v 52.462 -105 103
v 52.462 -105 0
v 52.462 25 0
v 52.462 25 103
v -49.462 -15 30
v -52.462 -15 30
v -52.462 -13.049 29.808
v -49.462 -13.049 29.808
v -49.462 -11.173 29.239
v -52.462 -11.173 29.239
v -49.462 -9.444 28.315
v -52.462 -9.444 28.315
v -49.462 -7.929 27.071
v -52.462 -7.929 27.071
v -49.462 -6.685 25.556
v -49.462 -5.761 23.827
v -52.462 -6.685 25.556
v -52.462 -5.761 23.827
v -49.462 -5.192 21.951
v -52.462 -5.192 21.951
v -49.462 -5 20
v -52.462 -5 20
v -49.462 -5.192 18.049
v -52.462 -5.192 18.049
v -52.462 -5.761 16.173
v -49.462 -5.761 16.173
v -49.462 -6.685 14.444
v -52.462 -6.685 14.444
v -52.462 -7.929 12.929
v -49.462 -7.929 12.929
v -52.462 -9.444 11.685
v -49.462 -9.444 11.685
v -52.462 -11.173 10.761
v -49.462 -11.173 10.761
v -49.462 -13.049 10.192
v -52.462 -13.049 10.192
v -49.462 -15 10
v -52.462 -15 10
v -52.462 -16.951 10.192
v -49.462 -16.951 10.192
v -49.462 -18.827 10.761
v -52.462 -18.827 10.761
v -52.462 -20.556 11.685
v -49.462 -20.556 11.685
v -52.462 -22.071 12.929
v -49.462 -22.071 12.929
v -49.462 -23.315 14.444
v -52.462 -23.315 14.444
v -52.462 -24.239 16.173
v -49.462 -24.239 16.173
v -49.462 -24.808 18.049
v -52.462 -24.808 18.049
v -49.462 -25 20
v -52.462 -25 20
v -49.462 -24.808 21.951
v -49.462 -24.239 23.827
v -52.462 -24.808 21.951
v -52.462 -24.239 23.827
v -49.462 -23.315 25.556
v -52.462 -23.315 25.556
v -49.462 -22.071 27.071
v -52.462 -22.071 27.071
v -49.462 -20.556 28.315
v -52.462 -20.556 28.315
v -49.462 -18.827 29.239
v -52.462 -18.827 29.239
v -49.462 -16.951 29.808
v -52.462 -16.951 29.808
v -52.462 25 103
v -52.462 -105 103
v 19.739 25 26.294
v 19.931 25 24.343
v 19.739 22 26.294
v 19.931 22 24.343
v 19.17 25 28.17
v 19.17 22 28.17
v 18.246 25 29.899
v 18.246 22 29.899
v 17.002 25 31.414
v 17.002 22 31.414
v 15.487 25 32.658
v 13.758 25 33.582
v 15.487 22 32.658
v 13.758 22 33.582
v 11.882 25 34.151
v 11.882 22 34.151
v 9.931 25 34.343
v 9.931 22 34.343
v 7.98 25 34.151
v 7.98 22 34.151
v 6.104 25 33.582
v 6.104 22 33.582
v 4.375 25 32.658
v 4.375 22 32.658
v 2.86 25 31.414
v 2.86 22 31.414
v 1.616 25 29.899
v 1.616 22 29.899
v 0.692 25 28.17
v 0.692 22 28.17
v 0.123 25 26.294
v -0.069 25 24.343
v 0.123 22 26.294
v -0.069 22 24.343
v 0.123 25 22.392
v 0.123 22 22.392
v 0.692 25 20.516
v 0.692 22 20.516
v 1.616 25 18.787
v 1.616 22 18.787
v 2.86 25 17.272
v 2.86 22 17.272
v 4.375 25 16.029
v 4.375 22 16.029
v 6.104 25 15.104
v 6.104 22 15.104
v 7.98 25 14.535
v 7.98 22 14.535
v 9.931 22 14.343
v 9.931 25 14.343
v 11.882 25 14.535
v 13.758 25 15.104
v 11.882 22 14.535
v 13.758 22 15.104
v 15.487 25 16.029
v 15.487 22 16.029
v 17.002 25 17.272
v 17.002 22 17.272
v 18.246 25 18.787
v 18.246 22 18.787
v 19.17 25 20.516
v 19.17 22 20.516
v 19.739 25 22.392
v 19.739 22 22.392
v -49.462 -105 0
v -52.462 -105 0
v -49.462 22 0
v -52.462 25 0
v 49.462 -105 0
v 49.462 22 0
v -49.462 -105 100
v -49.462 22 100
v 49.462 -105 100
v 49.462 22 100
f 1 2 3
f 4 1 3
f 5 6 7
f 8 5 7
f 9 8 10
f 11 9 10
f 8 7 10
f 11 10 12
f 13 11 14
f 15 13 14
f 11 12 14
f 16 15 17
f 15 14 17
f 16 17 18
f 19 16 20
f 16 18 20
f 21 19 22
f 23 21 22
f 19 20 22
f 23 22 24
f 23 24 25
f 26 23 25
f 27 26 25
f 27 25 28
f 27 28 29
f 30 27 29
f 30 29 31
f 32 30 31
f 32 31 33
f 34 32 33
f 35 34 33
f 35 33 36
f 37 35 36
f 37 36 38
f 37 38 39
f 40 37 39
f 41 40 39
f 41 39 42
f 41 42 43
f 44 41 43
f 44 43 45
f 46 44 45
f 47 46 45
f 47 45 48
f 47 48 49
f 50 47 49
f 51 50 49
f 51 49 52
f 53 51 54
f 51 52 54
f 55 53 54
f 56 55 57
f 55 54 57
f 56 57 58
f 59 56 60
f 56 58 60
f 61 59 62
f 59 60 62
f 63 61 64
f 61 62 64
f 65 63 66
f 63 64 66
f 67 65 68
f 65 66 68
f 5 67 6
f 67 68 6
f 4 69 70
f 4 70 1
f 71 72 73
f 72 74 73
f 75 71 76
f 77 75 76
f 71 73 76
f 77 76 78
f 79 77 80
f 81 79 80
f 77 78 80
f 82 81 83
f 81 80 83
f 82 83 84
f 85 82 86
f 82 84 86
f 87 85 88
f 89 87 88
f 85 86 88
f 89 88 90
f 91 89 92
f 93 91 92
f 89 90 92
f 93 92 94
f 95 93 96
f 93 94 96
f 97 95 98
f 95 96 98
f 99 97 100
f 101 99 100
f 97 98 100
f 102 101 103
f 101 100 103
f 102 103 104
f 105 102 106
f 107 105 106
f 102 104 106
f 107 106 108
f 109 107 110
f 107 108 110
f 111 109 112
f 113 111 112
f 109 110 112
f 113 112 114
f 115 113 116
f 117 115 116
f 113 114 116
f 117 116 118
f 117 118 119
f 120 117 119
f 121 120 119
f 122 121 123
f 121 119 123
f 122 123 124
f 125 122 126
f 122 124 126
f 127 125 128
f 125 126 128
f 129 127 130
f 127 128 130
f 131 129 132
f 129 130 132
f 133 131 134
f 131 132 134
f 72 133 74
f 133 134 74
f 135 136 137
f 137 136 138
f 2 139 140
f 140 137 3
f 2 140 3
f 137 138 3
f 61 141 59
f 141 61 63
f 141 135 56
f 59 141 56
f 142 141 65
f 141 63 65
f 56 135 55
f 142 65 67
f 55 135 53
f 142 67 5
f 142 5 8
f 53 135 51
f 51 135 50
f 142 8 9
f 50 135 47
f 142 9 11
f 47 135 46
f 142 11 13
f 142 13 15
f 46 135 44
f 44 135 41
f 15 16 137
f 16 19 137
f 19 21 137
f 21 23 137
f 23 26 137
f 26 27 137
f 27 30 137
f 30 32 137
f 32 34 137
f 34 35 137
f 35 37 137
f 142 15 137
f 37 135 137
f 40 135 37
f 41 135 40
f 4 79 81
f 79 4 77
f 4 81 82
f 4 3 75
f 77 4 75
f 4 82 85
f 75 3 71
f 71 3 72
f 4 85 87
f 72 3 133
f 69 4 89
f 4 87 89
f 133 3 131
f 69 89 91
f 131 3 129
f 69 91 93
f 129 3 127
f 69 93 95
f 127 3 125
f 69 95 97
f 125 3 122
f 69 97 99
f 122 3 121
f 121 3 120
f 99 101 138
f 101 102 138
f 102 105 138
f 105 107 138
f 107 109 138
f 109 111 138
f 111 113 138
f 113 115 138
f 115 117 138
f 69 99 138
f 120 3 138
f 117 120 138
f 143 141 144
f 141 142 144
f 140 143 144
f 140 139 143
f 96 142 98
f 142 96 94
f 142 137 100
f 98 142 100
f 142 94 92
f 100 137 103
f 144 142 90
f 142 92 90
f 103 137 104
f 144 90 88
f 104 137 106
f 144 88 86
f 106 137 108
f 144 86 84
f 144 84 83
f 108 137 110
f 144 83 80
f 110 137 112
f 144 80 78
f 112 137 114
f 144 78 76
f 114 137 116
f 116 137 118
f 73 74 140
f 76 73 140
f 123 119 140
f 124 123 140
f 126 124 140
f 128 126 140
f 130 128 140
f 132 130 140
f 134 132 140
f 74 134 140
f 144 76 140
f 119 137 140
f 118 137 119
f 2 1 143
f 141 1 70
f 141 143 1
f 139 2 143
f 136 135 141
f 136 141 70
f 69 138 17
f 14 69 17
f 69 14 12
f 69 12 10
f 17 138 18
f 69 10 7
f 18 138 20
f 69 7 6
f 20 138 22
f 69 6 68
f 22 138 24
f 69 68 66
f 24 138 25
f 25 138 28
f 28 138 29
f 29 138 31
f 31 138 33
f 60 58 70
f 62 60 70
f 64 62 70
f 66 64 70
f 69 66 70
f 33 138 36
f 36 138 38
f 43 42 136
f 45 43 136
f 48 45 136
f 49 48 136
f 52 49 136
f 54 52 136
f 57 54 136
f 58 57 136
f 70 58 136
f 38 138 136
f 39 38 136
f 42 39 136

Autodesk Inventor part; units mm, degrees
ref_plane "YZ Plane" through (0, 0, 0) normal (1, 0, 0) x (0, 1, 0)
ref_plane "XZ Plane" through (0, 0, 0) normal (0, 1, 0) x (-1, 0, 0)
ref_plane "XY Plane" through (0, 0, 0) normal (0, 0, 1) x (1, 0, 0)
sketch "Sketch1" plane through (0, 0, 0) normal (0, 0, 1) x (1, 0, 0)
  line L0 (52.4625, 25) -> (-52.4625, 25)
  line L1 (-52.4625, 25) -> (-52.4625, -105)
  line L2 (52.4625, -105) -> (52.4625, 25)
  line L3 (-96.7125, -125) -> (96.7125, -125) projected
  line L4 (55.4625, -110) -> (55.4625, -50) projected
  line L5 (-55.4625, -50) -> (-55.4625, -110) projected
  line L6 (52.4625, -105) -> (49.4625, -105)
  line L7 (49.4625, -105) -> (49.4625, 22)
  line L8 (49.4625, 25) -> (52.4625, 25)
  line L9 (52.4625, 25) -> (52.4625, -105)
  line L10 (-52.4625, -105) -> (-49.4625, -105)
  line L11 (-49.4625, -105) -> (-49.4625, 22)
  line L12 (-49.4625, 25) -> (-52.4625, 25)
  line L13 (-52.4625, 25) -> (-52.4625, -105)
  line L14 (49.4625, 25) -> (-49.4625, 25)
  line L15 (-49.4625, 22) -> (49.4625, 22)
  line L16 (-52.4625, -105) -> (-49.4625, -105)
  line L17 (49.4625, -105) -> (52.4625, -105)
  point P0 (0, 0)
  point P1 (50.9625, -105)
  dimension "d7" = 127
  dimension "d8" = 20
  dimension "d9" = 3
  dimension "d10" = 3
  dimension "d11" = 98.925
  dimension "d12" = 3
  dimension "d13" = 3
extrude "Extrusion1" add sketch "Sketch1" along normal blind 100
sketch "Sketch2" plane through (0, 0, 100) normal (0, 0, 1) x (1, 0, 0)
  line L0 (52.4625, -105) -> (52.4625, 25) projected
  line L1 (-52.4625, 25) -> (-52.4625, -105) projected
  line L2 (52.4625, 25) -> (-52.4625, 25)
  line L3 (-52.4625, 25) -> (-52.4625, -105)
  line L4 (-52.4625, -105) -> (52.4625, -105)
  line L5 (52.4625, -105) -> (52.4625, 25)
  point P0 (0, 0)
extrude "Extrusion2" add sketch "Sketch2" along normal blind 3
sketch "Sketch3" plane through (-52.4625, -105, 0) normal (-1, 0, 0) x (0, 0, 1)
  circle A0 centre (20, 90) radius 10
  line L0 (0, 130) -> (0, 0) projected
  line L1 (0, 130) -> (103, 130) projected
  point P0 (0, 105)
  dimension "d18" = 20
  dimension "d19" = 20
  dimension "d20" = 40
extrude "Extrusion3" cut sketch "Sketch3" against normal blind 3
sketch "Sketch4" plane through (-49.4625, 22, 0) normal (0, -1, 0) x (1, 0, 0)
  circle A0 centre (59.3936, 24.3432) radius 10
  point P0 (49.4625, 0)
  dimension "d23" = 20
extrude "Extrusion4" cut sketch "Sketch4" against normal blind 3
properties part number "HANG"
